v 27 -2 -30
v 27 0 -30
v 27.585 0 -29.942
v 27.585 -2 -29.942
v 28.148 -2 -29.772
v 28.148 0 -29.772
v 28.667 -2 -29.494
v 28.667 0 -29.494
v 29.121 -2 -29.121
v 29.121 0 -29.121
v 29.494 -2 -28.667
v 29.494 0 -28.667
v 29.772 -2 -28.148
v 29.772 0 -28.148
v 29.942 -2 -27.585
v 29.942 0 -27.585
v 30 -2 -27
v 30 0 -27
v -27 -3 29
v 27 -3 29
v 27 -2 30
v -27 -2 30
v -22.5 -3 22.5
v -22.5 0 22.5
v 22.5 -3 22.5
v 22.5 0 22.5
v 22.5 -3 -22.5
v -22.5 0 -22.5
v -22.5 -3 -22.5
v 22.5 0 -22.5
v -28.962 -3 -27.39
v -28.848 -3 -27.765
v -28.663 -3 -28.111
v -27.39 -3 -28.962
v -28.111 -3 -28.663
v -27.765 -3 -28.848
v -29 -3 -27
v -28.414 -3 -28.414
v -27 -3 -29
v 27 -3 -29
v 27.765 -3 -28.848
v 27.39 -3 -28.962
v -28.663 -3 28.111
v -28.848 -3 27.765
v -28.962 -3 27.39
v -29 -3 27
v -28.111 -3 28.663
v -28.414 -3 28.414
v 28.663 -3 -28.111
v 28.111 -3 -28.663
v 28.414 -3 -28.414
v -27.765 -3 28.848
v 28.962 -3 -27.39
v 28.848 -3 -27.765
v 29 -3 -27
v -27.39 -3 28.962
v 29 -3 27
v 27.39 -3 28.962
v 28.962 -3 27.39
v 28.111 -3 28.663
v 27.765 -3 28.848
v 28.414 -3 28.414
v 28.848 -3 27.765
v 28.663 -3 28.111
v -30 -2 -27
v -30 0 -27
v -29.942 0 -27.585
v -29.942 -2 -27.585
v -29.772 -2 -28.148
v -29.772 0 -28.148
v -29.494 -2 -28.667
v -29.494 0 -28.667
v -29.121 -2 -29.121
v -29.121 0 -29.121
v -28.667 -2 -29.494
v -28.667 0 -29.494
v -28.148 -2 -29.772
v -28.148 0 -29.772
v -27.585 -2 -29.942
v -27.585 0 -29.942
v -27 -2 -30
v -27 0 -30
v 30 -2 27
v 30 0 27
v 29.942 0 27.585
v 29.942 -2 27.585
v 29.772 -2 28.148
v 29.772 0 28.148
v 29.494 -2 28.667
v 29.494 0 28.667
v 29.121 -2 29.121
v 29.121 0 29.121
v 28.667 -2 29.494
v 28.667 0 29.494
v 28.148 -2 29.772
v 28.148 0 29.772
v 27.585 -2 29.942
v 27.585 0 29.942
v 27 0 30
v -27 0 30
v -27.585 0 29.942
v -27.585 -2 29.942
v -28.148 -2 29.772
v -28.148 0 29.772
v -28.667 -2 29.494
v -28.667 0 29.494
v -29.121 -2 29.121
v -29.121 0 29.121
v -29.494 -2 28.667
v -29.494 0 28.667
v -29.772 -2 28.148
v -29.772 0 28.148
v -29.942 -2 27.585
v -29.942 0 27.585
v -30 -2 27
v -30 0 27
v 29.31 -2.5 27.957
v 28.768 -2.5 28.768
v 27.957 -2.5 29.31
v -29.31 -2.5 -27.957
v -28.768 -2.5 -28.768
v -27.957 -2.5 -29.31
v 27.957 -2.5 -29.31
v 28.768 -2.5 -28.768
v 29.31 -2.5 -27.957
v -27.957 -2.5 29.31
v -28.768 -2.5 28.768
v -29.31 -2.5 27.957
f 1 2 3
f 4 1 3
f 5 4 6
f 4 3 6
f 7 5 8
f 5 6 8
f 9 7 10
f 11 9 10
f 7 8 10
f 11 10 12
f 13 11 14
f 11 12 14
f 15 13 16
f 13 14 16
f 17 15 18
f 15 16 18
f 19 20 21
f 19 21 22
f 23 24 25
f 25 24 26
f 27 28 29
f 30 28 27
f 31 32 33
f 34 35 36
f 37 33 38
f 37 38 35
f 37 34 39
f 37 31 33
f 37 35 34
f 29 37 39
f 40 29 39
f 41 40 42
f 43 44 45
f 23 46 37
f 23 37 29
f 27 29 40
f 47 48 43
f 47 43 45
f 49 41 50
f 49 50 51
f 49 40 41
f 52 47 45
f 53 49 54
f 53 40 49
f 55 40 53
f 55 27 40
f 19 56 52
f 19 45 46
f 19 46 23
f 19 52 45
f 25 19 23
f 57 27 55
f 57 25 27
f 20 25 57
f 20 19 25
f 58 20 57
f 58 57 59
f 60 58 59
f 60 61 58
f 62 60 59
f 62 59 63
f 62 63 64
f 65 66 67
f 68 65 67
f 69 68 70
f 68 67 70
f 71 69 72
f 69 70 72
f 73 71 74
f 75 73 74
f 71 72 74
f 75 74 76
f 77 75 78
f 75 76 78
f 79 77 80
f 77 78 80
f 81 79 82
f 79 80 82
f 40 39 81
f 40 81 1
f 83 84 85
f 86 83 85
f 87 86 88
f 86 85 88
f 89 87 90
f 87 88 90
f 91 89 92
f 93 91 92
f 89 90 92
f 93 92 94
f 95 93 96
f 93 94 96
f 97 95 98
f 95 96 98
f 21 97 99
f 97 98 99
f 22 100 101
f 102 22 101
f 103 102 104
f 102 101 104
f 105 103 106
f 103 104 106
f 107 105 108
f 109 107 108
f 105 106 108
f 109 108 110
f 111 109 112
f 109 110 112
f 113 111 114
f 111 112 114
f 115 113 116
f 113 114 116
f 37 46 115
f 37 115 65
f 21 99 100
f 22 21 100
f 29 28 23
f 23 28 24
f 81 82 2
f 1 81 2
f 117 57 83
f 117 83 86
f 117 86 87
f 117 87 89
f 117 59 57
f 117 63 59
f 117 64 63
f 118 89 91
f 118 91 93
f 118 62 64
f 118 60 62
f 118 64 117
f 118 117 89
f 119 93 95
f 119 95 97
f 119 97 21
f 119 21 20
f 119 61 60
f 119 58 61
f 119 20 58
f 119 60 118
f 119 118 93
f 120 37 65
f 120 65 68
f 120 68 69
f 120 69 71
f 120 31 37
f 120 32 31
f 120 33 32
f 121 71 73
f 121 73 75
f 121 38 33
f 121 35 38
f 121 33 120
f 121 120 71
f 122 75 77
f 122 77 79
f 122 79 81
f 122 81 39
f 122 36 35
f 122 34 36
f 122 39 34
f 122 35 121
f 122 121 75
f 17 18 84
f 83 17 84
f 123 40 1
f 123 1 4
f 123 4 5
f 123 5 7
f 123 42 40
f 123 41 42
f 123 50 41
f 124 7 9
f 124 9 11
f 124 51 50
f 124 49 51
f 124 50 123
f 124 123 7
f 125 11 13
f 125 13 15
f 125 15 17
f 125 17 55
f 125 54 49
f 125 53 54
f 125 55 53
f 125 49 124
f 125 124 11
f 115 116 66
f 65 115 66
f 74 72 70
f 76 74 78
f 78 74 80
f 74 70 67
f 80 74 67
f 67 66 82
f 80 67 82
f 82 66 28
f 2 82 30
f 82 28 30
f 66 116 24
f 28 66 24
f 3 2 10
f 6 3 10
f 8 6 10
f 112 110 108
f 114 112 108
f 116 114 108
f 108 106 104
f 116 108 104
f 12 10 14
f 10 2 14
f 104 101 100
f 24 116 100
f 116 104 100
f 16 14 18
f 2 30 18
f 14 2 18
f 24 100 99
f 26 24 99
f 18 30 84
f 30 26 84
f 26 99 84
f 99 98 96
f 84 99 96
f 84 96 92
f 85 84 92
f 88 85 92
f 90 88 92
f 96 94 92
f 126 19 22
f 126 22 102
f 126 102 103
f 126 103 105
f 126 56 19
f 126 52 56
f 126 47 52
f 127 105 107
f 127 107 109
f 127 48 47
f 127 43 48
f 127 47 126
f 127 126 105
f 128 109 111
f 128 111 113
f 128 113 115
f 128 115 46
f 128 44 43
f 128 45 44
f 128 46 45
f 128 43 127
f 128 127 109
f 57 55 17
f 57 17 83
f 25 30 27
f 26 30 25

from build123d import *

# Parameters (mm, degrees)
F0_W     = 45
F0_H     = 45
F1_DEPTH = 3
F2_SIZE  = 1


with BuildPart() as f1:
    # F0 (on Front) → F1 (new body)
    with BuildSketch(Plane.XZ):
        with BuildLine():
            Line((27, 30), (-27, 30))
            ThreePointArc((-27, 30), (-29.12132, 29.12132), (-30, 27))
            Line((-30, 27), (-30, -27))
            ThreePointArc((-30, -27), (-29.12132, -29.12132), (-27, -30))
            Line((-27, -30), (27, -30))
            ThreePointArc((27, -30), (29.12132, -29.12132), (30, -27))
            Line((30, -27), (30, 27))
            ThreePointArc((30, 27), (29.12132, 29.12132), (27, 30))
        make_face()
        Rectangle(F0_W, F0_H, mode=Mode.SUBTRACT)
    extrude(amount=F1_DEPTH)

    # F2
    f2_edges = [f1.edges().sort_by_distance(p)[0] for p in [
        (-30, -3, 0),
        (0, -3, 30),
        (30, -3, 0),
        (0, -3, -30),
    ]]
    chamfer(f2_edges, length=F2_SIZE)


solid = f1.part
